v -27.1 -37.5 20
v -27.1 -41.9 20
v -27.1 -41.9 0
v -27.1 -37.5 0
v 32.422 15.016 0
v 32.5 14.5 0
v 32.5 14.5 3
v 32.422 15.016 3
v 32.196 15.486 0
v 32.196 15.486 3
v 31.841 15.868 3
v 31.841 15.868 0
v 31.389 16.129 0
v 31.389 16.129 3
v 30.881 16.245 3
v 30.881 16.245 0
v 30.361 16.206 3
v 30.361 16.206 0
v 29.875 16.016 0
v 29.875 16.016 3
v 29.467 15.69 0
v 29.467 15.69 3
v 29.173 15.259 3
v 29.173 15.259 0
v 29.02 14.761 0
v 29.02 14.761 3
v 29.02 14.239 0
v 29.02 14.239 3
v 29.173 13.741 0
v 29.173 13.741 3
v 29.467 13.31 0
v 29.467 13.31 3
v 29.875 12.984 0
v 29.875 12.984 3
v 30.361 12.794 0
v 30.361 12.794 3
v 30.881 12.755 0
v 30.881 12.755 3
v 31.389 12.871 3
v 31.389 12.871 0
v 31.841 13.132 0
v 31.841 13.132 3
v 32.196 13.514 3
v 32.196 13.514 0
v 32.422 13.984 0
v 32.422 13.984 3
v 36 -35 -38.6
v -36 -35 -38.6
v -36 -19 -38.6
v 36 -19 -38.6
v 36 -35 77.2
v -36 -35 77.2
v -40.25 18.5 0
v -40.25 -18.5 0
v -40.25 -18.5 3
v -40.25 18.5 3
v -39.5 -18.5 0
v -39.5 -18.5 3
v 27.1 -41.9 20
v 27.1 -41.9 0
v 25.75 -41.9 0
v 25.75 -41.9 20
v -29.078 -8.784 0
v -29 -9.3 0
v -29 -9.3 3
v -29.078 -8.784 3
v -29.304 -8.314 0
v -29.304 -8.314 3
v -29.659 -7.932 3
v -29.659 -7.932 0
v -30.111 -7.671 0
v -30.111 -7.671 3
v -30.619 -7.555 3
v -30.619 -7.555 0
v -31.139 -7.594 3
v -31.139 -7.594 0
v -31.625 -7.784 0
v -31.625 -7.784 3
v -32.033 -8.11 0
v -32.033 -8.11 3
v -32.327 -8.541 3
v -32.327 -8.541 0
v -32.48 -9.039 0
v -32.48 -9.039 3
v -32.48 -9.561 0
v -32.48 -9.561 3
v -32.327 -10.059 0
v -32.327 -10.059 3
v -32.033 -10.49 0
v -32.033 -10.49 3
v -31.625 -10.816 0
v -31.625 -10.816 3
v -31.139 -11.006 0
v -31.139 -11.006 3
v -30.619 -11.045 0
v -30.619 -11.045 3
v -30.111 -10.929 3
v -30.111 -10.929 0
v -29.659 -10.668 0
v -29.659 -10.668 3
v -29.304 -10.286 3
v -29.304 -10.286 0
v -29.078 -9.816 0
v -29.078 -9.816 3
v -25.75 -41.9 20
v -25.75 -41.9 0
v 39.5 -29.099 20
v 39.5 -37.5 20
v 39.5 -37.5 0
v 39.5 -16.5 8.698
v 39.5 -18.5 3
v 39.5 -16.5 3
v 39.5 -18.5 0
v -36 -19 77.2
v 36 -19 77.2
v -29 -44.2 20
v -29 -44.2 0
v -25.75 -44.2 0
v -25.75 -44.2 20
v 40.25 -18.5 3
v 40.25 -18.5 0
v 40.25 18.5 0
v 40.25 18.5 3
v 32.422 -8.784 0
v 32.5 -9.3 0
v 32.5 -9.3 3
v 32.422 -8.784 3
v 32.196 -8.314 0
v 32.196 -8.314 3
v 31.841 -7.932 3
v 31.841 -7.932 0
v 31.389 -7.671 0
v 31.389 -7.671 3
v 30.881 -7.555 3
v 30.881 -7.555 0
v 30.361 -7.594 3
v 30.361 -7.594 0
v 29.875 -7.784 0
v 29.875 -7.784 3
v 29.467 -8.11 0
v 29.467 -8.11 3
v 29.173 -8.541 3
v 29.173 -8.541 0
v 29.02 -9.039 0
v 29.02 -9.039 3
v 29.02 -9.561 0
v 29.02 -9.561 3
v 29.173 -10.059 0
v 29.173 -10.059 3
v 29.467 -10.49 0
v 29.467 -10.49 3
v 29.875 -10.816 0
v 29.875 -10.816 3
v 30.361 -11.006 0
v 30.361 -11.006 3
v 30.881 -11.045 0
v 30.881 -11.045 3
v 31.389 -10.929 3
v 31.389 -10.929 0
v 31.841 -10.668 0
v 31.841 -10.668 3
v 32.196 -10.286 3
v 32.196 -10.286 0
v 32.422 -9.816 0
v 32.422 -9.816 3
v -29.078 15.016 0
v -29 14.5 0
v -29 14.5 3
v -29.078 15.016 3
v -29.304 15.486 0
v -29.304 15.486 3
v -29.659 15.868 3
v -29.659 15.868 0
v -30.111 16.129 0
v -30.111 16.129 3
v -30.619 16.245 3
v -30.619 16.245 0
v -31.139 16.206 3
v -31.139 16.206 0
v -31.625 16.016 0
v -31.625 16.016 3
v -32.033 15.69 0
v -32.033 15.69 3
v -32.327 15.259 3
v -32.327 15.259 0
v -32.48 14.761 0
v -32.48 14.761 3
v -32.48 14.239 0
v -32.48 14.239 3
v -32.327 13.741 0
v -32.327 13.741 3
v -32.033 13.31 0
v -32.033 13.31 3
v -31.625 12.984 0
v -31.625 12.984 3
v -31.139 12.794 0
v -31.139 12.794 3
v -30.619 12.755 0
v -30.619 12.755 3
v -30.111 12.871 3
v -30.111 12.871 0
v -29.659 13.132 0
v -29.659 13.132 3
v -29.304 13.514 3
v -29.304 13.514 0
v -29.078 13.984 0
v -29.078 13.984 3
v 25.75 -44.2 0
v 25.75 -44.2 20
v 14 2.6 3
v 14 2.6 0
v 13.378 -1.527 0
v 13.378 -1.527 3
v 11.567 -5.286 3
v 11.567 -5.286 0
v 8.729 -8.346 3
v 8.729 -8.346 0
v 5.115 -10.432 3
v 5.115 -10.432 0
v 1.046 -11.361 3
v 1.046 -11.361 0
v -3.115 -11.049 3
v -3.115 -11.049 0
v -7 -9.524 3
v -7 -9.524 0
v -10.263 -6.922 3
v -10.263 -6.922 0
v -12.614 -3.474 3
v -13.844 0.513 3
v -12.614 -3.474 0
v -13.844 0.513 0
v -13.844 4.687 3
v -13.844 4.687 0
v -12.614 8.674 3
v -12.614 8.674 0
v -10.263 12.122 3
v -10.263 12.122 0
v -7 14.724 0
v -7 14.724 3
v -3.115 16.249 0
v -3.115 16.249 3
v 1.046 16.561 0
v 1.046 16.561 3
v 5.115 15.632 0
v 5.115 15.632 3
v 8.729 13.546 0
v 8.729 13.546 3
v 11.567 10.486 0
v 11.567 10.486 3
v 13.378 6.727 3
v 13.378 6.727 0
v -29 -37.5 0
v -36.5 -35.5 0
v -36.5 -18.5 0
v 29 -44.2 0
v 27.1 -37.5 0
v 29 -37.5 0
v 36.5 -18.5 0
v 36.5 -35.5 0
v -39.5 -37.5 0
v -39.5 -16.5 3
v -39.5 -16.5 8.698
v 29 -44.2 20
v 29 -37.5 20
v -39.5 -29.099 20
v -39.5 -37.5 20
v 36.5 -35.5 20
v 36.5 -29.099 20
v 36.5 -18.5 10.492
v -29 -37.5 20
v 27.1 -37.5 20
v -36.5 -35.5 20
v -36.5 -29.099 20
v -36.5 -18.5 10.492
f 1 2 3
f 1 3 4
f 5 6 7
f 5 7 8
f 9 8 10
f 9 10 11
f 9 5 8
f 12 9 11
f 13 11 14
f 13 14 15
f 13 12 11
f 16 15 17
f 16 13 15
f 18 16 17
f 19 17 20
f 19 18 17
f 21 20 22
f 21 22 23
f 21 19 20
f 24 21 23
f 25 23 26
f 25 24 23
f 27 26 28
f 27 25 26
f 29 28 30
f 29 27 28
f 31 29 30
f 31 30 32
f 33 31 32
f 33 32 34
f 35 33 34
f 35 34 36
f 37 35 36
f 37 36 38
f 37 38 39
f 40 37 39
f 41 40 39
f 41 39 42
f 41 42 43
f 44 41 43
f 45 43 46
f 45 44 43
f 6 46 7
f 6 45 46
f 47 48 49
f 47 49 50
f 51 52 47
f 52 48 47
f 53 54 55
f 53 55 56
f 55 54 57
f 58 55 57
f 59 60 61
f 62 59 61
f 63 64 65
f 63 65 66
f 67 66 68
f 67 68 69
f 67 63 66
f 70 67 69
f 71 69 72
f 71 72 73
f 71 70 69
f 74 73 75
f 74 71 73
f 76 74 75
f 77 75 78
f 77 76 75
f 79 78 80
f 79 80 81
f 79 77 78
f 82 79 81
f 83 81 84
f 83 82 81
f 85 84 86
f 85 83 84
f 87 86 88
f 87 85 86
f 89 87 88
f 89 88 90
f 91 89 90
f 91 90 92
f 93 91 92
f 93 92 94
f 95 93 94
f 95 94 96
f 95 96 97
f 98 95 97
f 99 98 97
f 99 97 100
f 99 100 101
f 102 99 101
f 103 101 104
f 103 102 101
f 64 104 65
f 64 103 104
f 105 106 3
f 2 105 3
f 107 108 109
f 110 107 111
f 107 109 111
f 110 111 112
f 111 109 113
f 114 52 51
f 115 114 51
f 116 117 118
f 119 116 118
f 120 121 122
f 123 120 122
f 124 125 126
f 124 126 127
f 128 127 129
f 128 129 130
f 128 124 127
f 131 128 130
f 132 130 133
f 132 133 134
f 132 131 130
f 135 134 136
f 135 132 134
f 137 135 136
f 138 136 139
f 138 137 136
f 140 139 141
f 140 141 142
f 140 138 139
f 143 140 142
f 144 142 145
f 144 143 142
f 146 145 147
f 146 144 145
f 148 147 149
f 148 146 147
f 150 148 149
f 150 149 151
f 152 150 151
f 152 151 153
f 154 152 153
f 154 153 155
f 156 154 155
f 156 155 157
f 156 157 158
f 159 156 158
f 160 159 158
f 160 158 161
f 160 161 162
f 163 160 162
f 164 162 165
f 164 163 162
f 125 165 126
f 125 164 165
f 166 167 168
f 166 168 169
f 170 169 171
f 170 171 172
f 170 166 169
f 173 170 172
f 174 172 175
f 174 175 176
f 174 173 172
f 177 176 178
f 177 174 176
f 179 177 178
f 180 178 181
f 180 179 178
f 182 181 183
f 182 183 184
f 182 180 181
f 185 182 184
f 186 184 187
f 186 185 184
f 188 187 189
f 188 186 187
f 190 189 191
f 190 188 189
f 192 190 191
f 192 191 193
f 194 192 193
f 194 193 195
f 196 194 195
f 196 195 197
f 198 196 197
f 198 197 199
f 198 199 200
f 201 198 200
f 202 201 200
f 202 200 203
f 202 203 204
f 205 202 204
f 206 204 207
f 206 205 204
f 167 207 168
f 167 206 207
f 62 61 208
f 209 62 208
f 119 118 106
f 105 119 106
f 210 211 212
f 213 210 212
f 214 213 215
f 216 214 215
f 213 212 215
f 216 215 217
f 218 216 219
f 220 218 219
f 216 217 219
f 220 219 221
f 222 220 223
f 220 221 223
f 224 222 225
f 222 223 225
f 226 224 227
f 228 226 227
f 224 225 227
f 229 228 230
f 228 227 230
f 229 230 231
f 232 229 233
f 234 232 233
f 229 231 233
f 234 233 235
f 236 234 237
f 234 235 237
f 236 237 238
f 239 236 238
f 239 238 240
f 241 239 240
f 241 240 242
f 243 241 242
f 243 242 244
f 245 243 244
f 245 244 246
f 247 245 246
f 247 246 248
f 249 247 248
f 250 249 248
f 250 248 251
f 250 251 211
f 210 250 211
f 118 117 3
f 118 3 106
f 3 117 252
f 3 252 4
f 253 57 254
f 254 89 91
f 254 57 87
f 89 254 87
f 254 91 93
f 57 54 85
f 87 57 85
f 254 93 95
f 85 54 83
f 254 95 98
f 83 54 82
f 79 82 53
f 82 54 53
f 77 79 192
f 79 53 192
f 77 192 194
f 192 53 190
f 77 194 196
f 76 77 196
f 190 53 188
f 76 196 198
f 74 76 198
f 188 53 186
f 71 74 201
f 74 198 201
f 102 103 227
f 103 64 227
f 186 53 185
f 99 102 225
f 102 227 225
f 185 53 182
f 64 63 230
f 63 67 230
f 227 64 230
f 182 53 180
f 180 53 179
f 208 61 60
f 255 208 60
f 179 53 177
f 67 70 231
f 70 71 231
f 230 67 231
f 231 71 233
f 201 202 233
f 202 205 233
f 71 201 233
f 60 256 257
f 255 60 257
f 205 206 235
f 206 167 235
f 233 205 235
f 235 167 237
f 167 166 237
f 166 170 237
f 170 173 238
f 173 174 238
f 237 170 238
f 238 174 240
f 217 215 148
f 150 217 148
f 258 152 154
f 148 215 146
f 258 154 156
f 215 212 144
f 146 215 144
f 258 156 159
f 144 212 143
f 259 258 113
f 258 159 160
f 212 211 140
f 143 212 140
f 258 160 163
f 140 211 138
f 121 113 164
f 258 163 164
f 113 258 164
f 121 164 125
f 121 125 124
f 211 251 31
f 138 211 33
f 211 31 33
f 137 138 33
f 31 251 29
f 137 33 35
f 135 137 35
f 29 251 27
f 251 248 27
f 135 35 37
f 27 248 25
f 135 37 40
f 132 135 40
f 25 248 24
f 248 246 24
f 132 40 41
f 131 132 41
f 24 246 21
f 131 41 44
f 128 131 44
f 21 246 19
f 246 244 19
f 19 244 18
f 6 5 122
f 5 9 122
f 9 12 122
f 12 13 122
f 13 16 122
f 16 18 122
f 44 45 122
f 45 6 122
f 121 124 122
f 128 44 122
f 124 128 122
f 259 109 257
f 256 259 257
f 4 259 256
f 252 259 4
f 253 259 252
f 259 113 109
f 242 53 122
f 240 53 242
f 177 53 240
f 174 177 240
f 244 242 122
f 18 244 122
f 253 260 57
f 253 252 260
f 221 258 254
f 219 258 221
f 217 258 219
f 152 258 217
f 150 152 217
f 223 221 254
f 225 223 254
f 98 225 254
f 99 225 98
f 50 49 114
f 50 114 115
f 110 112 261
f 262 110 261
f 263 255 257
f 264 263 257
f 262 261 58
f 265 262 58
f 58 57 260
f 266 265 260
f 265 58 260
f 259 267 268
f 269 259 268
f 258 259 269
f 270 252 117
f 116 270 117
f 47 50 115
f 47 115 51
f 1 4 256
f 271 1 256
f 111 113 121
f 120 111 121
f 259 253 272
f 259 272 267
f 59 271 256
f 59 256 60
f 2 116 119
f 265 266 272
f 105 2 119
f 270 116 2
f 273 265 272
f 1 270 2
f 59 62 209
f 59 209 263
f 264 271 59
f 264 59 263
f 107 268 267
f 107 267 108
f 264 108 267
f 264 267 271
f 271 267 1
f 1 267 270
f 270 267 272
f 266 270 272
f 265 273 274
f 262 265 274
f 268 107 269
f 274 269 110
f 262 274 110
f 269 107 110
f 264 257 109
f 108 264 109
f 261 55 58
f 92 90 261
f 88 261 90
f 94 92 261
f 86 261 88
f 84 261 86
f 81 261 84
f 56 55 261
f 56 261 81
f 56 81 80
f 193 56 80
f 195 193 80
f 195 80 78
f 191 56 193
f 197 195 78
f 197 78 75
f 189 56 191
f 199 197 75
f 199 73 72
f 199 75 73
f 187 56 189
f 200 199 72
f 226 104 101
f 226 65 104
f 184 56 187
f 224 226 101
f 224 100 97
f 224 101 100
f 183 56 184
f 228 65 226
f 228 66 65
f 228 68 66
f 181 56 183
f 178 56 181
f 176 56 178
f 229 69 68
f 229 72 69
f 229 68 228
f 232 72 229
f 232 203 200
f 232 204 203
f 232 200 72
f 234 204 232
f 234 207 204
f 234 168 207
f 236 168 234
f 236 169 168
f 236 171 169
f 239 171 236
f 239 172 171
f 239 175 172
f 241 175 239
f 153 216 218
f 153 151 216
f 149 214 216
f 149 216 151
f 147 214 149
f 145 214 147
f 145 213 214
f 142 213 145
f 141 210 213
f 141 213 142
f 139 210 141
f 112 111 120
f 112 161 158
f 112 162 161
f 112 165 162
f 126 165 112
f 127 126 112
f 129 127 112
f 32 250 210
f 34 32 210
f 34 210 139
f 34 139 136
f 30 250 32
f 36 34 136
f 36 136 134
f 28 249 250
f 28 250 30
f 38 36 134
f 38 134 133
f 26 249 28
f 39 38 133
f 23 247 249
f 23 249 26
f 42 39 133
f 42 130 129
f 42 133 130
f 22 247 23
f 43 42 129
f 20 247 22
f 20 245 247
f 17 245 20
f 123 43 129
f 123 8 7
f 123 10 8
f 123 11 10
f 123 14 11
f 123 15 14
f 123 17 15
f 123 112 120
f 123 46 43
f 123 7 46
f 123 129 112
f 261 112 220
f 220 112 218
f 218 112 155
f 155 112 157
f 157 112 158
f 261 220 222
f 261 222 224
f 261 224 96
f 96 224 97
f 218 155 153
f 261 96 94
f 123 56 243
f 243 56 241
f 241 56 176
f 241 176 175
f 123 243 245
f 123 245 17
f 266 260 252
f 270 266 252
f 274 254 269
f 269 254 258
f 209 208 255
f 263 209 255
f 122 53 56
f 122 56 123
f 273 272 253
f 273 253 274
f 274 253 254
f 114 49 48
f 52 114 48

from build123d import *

# Parameters (mm, degrees)
F0_W           = 80.5
F0_H           = 37
F0_R           = 1.75
F1_DEPTH       = 3
F2_W           = 73
F2_H           = 17
F3_DEPTH       = 20
F5_DEPTH       = 79
F6_R           = 14
F7_DEPTH       = 25
F8_R           = 3.15
F9_DEPTH       = 25
F10_W          = 72
F10_H          = 16
F11_DEPTH      = 38.6
F11_DEPTH_BACK = 77.2


with BuildPart() as f1:
    # F0 (on Top) → F1 (new body)
    with BuildSketch(Plane.XY):
        Rectangle(F0_W, F0_H)
        with Locations((-30.75, -9.3)):
            Circle(F0_R, mode=Mode.SUBTRACT)
        with Locations((30.75, -9.3)):
            Circle(F0_R, mode=Mode.SUBTRACT)
        with Locations((-30.75, 14.5)):
            Circle(F0_R, mode=Mode.SUBTRACT)
        with Locations((30.75, 14.5)):
            Circle(F0_R, mode=Mode.SUBTRACT)
    extrude(amount=F1_DEPTH)

    # F2 (on Top) → F3 (join)
    with BuildSketch(Plane.XY):
        Polygon((39.5, -37.5), (39.5, -16.5), (-39.5, -16.5), (-39.5, -37.5), (-29, -37.5), (-27.1, -37.5), (27.1, -37.5), (29, -37.5), align=None)
        with Locations((0, -27)):
            Rectangle(F2_W, F2_H, mode=Mode.SUBTRACT)
        Polygon((-27.1, -37.5), (-29, -37.5), (-29, -44.2), (-25.75, -44.2), (-25.75, -41.9), (-27.1, -41.9), align=None)
        Polygon((29, -44.2), (29, -37.5), (27.1, -37.5), (27.1, -41.9), (25.75, -41.9), (25.75, -44.2), align=None)
    extrude(amount=F3_DEPTH)

    # F4 (on face) → F5 (cut, through all)
    with BuildSketch(Plane.YZ.offset(39.5)):
        Polygon((-16.5, 8.698019), (-16.5, 20), (-29.098514, 20), align=None)
    extrude(amount=-F5_DEPTH, mode=Mode.SUBTRACT)

    # F6 (on face) → F7 (cut)
    with BuildSketch(Plane(origin=(0, 0, 0), x_dir=(1, 0, 0), z_dir=(0, 0, -1))):
        with Locations((0, -2.6)):
            Circle(F6_R)
    extrude(amount=-F7_DEPTH, mode=Mode.SUBTRACT)

    # F8 (on face) → F9 (cut)
    with BuildSketch(Plane.XY.offset(3)):
        with Locations((30.75, -9.3)):
            Circle(F8_R)
        with Locations((-30.75, -9.3)):
            Circle(F8_R)
    extrude(amount=F9_DEPTH, mode=Mode.SUBTRACT)


with BuildPart() as f11:
    # F10 (on face) → F11 (new body, two sides)
    with BuildSketch(Plane(origin=(0, 0, 0), x_dir=(1, 0, 0), z_dir=(0, 0, -1))) as f11_sk:
        with Locations((0, 27)):
            Rectangle(F10_W, F10_H)
    extrude(amount=F11_DEPTH)
    extrude(f11_sk.sketch, amount=-F11_DEPTH_BACK)


solid = Compound([f1.part, f11.part])
